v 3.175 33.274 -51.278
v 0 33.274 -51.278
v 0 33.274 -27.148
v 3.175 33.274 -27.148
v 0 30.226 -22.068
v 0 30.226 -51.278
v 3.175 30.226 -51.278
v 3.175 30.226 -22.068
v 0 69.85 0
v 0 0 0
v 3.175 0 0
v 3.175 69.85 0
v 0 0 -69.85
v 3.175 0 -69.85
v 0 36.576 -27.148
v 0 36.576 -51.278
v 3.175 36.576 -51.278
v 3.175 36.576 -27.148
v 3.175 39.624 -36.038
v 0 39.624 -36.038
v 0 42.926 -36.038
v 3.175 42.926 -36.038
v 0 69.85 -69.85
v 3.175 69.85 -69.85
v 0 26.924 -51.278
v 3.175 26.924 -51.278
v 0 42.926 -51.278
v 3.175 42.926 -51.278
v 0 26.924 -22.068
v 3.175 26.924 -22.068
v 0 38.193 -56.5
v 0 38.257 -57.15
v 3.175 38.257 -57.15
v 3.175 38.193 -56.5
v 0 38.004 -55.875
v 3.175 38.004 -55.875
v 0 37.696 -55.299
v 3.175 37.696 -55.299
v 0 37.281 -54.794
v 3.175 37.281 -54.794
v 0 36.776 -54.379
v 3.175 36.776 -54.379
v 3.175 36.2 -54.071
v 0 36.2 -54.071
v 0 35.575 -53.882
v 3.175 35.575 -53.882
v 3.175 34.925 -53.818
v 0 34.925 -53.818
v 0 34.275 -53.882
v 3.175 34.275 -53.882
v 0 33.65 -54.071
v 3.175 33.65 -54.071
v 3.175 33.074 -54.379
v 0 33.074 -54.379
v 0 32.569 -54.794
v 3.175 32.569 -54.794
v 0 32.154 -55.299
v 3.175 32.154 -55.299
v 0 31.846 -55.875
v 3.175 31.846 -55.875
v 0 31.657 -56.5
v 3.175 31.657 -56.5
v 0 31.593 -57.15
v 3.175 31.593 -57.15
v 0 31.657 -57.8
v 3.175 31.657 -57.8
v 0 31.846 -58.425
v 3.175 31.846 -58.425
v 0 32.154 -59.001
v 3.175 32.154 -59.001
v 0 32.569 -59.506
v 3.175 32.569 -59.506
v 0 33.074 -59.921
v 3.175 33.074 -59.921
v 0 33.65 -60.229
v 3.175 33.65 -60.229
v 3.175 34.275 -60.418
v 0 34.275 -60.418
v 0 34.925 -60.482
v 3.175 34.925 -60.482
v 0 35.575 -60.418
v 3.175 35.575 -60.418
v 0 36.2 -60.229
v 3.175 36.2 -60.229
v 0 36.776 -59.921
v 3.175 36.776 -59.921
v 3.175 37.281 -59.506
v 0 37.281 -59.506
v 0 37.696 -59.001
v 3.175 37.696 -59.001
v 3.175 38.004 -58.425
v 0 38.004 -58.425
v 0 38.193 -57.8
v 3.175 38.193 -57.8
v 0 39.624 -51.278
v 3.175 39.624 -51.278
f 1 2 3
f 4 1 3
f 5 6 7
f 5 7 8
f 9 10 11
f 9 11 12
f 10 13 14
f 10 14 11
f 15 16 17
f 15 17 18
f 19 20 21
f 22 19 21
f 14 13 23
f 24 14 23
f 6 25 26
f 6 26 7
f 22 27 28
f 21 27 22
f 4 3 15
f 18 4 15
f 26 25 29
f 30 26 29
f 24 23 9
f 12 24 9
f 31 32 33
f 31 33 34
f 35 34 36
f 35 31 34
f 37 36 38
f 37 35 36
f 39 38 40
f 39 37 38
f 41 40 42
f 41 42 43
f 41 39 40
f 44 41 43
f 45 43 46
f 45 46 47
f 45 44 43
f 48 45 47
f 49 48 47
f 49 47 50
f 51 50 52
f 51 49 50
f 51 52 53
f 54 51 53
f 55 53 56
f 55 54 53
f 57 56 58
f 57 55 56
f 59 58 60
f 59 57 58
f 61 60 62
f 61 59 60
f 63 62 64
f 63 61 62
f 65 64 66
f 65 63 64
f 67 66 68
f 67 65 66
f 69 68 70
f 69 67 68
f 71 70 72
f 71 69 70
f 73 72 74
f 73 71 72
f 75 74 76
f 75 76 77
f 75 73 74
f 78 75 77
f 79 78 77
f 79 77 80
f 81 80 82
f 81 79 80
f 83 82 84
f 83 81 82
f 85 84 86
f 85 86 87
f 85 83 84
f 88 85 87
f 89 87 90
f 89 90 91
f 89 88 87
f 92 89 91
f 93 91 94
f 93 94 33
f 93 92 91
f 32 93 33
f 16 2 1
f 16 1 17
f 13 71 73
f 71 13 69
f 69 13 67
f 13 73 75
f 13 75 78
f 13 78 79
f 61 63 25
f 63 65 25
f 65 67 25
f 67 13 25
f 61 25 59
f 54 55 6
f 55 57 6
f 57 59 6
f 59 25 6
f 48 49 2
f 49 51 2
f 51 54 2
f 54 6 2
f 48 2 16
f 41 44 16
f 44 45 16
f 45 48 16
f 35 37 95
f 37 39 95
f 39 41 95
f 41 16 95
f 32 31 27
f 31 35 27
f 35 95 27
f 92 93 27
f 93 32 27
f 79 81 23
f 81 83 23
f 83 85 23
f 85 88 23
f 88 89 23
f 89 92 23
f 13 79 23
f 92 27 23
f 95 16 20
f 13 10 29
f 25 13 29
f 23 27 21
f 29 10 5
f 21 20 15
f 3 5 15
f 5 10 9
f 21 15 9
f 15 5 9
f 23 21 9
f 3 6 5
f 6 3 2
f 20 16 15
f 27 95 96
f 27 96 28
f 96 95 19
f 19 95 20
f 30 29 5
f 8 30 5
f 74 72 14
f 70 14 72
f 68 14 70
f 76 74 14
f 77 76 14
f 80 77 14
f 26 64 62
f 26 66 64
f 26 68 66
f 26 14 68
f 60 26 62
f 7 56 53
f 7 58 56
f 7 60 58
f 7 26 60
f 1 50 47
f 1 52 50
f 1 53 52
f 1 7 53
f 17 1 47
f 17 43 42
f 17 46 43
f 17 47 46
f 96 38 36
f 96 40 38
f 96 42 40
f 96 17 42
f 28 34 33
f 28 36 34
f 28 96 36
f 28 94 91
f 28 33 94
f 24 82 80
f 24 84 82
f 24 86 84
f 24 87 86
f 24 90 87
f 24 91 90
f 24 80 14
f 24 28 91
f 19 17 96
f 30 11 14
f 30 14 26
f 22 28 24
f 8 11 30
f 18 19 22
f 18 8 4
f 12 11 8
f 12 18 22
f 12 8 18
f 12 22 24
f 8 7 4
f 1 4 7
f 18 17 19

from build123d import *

# Parameters (mm, degrees)
F0_W     = 69.85
F0_H     = 69.85
F0_W_2   = 3.302
F0_H_2   = 29.21
F0_R     = 3.332443
F0_H_3   = 15.24
F0_H_4   = 24.13
F1_DEPTH = 3.175


with BuildPart() as f1:
    # F0 (on Right) → F1 (new body)
    with BuildSketch(Plane.YZ):
        with Locations((34.925, -34.925)):
            Rectangle(F0_W, F0_H)
        with Locations((28.575, -36.672557)):
            Rectangle(F0_W_2, F0_H_2, mode=Mode.SUBTRACT)
        with Locations((34.925, -57.15)):
            Circle(F0_R, mode=Mode.SUBTRACT)
        with Locations((41.275, -43.657557)):
            Rectangle(F0_W_2, F0_H_3, mode=Mode.SUBTRACT)
        with Locations((34.925, -39.212557)):
            Rectangle(F0_W_2, F0_H_4, mode=Mode.SUBTRACT)
    extrude(amount=F1_DEPTH)


solid = f1.part
